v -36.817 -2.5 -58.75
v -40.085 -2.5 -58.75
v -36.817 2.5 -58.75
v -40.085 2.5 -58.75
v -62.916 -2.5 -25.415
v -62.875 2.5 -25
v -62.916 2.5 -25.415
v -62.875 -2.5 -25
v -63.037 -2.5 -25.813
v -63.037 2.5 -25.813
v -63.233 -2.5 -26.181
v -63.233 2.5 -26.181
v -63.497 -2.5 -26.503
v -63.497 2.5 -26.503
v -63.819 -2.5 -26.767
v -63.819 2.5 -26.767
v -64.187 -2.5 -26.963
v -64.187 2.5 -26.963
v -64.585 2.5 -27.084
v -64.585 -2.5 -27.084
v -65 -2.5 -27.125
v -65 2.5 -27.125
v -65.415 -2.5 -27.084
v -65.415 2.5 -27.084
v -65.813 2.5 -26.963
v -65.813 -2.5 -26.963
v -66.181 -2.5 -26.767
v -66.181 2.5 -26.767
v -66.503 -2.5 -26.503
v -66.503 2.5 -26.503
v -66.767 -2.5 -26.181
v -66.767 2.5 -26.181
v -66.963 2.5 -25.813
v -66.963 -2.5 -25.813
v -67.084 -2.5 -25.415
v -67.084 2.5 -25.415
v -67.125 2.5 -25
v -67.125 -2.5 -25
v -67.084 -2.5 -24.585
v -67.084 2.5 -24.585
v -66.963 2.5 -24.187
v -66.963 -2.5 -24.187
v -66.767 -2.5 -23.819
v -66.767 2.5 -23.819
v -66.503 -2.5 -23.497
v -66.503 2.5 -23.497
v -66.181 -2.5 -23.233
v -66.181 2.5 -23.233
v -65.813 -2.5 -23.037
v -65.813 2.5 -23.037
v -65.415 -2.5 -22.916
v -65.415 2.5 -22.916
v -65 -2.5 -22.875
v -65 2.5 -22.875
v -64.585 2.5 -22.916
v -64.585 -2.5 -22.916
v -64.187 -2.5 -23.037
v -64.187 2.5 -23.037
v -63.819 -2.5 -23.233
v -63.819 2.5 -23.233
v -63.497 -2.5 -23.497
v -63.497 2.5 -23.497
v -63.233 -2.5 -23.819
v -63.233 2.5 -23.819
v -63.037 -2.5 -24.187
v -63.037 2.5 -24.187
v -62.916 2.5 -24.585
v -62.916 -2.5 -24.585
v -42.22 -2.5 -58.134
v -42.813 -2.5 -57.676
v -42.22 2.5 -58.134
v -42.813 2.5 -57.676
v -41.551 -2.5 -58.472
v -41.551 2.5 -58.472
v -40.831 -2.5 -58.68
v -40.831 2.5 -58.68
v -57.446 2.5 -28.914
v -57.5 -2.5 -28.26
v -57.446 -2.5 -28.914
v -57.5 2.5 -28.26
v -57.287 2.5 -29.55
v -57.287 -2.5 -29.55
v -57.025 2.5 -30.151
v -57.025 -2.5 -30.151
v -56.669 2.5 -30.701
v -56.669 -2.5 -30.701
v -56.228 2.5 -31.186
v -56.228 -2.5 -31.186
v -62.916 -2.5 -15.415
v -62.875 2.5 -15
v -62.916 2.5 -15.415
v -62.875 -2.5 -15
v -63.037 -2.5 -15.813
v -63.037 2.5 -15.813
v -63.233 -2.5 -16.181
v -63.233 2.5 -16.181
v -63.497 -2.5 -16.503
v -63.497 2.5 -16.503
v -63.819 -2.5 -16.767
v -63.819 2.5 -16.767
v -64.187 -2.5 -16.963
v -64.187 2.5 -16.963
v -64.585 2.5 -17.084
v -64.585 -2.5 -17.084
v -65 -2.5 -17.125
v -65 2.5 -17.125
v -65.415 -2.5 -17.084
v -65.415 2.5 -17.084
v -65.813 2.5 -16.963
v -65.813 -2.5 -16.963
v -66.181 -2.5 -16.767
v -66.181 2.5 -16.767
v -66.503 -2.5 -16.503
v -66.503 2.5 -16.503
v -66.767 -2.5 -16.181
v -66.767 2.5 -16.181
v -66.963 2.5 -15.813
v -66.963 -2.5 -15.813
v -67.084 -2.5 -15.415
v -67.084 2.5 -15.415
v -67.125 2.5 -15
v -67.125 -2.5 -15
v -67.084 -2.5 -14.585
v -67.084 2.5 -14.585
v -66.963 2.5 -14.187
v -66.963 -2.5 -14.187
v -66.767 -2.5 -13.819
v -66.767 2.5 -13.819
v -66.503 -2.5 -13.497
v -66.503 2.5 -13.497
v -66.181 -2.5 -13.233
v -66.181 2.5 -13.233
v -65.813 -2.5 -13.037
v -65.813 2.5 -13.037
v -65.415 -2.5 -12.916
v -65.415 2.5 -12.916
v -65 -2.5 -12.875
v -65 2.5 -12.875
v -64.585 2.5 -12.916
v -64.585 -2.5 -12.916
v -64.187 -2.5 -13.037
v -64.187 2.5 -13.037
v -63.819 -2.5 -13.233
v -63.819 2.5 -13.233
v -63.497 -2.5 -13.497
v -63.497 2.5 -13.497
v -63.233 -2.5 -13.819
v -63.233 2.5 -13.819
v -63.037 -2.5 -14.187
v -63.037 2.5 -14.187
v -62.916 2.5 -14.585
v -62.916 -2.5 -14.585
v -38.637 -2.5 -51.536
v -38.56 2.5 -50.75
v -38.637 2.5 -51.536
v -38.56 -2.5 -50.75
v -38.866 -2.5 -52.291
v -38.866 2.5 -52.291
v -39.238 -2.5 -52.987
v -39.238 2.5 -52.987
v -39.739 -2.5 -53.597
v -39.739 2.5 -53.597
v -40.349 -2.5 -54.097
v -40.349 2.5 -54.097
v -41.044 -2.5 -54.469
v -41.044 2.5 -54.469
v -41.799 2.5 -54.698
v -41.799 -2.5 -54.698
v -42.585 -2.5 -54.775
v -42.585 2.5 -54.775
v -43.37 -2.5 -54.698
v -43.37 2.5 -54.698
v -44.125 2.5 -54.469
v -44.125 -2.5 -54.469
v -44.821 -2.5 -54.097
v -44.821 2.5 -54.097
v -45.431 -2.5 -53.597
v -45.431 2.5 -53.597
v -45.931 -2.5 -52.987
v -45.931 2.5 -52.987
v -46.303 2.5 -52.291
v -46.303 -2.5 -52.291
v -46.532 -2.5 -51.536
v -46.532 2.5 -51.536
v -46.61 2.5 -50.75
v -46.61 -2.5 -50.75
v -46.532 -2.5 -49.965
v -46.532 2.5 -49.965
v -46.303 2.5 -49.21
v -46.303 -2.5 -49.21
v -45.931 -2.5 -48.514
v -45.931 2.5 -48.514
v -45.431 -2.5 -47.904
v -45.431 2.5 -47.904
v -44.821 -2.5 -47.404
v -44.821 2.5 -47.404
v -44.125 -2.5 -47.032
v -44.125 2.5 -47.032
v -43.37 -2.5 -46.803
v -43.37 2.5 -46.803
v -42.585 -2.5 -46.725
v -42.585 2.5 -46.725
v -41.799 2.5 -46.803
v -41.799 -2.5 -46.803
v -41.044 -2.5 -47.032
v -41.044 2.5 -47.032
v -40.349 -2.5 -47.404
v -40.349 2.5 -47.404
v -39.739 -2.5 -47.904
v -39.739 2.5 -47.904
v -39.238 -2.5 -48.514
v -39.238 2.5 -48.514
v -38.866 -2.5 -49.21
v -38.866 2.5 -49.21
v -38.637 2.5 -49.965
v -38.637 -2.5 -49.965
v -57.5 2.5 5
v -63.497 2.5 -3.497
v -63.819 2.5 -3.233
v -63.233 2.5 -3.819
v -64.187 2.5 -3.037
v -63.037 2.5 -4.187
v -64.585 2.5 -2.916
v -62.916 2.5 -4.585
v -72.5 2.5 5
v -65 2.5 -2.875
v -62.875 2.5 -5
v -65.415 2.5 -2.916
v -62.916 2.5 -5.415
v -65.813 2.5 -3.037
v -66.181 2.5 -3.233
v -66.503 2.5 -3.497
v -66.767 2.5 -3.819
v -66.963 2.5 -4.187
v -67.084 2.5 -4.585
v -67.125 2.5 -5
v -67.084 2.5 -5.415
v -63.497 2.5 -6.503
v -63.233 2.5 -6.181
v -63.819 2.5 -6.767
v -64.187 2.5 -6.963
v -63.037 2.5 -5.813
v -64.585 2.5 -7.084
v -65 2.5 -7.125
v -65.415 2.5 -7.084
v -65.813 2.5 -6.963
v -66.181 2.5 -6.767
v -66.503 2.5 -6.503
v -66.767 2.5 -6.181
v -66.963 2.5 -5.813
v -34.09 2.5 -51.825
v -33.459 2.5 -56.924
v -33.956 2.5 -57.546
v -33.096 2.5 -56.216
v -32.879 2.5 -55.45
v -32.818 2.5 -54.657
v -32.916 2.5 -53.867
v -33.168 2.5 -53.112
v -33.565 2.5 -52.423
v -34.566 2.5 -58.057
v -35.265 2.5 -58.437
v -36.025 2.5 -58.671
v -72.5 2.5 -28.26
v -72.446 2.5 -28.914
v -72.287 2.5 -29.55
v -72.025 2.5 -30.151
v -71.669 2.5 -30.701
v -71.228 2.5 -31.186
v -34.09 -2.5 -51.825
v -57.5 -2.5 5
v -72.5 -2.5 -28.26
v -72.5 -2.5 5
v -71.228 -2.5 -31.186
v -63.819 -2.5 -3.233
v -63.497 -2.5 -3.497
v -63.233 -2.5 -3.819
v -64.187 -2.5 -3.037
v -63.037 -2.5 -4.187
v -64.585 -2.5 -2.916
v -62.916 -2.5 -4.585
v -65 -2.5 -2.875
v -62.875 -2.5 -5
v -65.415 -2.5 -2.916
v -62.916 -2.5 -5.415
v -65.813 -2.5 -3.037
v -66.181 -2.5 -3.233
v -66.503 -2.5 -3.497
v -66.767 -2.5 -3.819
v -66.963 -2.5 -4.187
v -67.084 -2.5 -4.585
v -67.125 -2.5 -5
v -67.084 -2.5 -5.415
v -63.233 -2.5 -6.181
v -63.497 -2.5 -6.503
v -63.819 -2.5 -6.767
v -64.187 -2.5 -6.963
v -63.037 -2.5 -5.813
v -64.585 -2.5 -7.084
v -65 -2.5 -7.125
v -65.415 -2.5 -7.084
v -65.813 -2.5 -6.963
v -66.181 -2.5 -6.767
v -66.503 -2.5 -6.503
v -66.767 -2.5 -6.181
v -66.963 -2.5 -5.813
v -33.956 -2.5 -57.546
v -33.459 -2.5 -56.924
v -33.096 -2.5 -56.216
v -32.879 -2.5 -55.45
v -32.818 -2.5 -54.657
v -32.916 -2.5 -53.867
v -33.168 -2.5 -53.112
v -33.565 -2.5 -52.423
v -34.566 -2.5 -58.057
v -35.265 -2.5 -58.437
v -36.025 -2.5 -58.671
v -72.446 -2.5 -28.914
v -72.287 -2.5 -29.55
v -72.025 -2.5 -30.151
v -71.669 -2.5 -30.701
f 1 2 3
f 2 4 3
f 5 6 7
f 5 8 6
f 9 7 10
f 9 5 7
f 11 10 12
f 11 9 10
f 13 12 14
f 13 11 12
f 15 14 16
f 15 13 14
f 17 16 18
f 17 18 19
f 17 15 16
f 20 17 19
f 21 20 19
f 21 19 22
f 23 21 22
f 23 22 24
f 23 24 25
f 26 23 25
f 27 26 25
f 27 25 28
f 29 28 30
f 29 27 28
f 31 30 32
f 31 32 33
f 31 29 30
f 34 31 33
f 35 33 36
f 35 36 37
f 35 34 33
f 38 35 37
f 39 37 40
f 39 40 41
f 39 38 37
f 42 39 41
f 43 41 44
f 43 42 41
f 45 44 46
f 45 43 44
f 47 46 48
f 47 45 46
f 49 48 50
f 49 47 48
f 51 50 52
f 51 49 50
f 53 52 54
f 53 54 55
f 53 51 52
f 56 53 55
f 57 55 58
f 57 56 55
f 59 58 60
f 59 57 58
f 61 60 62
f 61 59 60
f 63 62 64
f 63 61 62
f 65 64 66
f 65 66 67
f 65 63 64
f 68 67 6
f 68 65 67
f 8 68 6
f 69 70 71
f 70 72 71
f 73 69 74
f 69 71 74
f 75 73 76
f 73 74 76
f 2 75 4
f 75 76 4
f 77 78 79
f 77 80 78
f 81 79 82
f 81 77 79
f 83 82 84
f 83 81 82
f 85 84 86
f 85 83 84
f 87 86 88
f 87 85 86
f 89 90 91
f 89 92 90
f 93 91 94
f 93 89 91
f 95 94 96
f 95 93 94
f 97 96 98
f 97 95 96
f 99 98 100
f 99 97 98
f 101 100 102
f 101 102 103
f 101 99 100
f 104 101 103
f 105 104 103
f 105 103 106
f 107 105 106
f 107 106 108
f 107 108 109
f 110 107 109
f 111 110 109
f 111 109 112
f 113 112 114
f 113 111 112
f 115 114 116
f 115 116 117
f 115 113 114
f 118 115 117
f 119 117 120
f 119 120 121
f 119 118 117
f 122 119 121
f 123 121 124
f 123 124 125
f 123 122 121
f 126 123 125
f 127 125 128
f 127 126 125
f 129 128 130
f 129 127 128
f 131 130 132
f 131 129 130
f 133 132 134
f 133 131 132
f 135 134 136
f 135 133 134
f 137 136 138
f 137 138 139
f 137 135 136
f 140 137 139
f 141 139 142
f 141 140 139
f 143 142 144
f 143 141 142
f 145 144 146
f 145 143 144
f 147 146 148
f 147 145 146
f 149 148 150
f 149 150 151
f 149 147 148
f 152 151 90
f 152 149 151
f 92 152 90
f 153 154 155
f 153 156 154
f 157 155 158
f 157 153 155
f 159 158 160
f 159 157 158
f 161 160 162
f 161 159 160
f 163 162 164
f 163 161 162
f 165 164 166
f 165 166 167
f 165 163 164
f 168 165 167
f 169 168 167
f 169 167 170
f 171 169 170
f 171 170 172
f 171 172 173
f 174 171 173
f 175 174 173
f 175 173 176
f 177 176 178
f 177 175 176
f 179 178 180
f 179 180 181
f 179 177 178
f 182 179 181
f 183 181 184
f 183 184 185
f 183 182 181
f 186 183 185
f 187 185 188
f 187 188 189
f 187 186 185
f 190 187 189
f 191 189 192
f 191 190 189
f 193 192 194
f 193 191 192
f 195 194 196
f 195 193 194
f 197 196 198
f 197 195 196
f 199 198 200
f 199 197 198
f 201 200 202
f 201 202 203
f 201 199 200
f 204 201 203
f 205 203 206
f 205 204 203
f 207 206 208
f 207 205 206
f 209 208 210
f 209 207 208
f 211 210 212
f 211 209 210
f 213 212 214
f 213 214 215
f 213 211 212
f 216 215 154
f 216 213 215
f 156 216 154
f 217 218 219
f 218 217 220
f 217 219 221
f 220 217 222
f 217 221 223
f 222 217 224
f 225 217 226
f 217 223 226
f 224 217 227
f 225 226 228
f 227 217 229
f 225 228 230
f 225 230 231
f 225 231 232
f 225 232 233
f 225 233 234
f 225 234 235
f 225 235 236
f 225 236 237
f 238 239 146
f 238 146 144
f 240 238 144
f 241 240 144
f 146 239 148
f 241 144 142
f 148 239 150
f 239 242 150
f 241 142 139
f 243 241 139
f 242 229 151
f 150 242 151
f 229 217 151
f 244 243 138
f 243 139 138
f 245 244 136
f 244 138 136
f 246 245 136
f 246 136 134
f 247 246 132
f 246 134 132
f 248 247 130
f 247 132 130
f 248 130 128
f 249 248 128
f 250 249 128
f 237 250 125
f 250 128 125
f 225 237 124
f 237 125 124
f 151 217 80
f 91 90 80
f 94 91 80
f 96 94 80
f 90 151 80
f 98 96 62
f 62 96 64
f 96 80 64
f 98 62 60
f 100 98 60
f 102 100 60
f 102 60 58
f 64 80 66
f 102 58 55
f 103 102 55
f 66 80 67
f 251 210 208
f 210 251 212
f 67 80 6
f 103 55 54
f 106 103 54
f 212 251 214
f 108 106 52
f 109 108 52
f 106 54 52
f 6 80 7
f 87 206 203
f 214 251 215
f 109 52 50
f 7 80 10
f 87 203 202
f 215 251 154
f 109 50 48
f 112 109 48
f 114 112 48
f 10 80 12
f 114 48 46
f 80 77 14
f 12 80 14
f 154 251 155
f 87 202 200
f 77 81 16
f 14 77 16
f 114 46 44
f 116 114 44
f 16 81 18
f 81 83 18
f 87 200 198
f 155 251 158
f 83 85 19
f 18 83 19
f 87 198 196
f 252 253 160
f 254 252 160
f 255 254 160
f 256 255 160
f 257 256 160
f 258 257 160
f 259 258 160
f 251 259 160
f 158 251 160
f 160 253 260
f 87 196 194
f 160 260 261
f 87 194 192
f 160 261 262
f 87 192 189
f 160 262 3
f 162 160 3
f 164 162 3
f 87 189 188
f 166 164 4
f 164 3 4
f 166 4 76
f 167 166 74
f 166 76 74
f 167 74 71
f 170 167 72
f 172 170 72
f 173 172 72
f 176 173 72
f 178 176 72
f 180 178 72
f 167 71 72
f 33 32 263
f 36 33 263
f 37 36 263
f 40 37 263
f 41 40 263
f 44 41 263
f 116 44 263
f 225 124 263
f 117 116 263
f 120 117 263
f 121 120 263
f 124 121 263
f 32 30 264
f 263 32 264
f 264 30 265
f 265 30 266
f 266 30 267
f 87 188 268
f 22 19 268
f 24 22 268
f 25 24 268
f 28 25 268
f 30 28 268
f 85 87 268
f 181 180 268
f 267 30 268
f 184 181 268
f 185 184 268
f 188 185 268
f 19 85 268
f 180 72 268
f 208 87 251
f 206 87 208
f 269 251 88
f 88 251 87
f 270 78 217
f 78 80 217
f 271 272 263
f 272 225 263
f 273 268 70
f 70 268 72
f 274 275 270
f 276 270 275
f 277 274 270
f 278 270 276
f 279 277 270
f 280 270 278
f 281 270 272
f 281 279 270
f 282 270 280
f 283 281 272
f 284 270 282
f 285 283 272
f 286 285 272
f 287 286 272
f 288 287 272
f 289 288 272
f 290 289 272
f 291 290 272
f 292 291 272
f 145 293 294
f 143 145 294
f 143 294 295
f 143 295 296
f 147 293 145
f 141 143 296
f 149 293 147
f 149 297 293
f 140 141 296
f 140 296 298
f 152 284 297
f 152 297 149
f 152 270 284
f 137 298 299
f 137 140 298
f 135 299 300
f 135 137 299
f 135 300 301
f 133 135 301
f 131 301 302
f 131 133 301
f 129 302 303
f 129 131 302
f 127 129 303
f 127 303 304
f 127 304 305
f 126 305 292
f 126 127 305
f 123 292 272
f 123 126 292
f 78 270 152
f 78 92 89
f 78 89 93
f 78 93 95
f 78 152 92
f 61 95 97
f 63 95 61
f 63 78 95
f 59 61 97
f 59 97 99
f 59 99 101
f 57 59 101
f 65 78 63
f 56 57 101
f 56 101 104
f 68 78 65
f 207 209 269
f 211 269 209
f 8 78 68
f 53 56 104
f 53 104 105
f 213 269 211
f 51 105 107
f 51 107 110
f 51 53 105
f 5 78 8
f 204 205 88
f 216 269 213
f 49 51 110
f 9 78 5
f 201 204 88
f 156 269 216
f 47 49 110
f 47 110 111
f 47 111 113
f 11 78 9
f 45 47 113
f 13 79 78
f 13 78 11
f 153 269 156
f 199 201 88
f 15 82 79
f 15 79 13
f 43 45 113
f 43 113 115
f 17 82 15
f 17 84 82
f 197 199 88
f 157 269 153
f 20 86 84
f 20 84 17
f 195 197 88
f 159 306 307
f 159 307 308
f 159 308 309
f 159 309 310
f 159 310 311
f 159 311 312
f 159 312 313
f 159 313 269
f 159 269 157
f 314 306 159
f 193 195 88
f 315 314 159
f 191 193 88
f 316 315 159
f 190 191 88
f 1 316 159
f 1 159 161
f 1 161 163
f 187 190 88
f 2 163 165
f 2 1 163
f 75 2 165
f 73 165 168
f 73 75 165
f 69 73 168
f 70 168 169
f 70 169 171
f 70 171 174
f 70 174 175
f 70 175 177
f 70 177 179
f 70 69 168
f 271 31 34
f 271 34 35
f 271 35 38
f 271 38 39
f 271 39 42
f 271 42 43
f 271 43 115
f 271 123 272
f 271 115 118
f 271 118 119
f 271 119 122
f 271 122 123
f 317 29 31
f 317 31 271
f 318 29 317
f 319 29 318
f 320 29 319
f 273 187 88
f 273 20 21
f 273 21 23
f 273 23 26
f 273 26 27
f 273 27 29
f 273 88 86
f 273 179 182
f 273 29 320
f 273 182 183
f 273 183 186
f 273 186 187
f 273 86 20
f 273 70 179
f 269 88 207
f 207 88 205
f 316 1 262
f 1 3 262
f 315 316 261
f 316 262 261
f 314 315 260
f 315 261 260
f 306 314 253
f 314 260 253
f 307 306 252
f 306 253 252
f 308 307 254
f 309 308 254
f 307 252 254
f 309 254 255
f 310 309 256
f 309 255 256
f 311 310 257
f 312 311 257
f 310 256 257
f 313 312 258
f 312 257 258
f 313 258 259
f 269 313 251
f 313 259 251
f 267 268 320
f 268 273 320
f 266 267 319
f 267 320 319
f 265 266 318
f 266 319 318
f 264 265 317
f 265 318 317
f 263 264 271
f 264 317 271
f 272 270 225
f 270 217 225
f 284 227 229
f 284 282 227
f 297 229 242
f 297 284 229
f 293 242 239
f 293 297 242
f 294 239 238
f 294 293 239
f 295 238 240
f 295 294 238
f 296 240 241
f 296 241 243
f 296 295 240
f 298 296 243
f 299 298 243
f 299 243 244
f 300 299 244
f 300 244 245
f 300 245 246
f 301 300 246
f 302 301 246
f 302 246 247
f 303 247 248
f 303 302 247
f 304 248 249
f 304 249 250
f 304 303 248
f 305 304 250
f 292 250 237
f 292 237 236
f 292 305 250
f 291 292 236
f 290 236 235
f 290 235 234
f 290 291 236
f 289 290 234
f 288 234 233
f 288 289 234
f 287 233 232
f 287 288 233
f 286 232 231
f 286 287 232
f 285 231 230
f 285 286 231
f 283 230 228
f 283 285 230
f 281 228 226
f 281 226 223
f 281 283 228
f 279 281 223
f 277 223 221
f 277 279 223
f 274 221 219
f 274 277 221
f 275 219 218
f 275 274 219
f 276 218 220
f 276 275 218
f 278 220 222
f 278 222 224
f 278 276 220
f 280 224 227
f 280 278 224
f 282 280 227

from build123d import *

# Parameters (mm, degrees)
SKETCH1_R           = 2.125
SKETCH1_R_2         = 4.025
BOSS_EXTRUDE1_DEPTH = 2.5
FILLET1_R           = 4


with BuildPart() as part:
    # Sketch1 → Boss-Extrude1 (new body, symmetric)
    with BuildSketch(Plane(origin=(0, 0, 0), x_dir=(1, 0, 0), z_dir=(0, 1, 0))):
        Polygon((-57.5, 30), (-57.5, -5), (-72.5, -5), (-72.5, 30), (-41.660750149, 58.750444357), (-26.660750149, 58.750444357), align=None)
        with Locations((-65, 25)):
            Circle(SKETCH1_R, mode=Mode.SUBTRACT)
        with Locations((-65, 15)):
            Circle(SKETCH1_R, mode=Mode.SUBTRACT)
        with Locations((-42.584679142, 50.750444357)):
            Circle(SKETCH1_R_2, mode=Mode.SUBTRACT)
        with Locations((-65, 5)):
            Circle(SKETCH1_R, mode=Mode.SUBTRACT)
    extrude(amount=BOSS_EXTRUDE1_DEPTH, both=True)

    # Fillet1
    fillet1_edges = [part.edges().sort_by_distance(p)[0] for p in [
        (-72.5, 0, -30),
        (-41.660750149, 0, -58.750444357),
        (-26.660750149, 0, -58.750444357),
        (-57.5, 0, -30),
    ]]
    fillet(fillet1_edges, radius=FILLET1_R)


solid = part.part
